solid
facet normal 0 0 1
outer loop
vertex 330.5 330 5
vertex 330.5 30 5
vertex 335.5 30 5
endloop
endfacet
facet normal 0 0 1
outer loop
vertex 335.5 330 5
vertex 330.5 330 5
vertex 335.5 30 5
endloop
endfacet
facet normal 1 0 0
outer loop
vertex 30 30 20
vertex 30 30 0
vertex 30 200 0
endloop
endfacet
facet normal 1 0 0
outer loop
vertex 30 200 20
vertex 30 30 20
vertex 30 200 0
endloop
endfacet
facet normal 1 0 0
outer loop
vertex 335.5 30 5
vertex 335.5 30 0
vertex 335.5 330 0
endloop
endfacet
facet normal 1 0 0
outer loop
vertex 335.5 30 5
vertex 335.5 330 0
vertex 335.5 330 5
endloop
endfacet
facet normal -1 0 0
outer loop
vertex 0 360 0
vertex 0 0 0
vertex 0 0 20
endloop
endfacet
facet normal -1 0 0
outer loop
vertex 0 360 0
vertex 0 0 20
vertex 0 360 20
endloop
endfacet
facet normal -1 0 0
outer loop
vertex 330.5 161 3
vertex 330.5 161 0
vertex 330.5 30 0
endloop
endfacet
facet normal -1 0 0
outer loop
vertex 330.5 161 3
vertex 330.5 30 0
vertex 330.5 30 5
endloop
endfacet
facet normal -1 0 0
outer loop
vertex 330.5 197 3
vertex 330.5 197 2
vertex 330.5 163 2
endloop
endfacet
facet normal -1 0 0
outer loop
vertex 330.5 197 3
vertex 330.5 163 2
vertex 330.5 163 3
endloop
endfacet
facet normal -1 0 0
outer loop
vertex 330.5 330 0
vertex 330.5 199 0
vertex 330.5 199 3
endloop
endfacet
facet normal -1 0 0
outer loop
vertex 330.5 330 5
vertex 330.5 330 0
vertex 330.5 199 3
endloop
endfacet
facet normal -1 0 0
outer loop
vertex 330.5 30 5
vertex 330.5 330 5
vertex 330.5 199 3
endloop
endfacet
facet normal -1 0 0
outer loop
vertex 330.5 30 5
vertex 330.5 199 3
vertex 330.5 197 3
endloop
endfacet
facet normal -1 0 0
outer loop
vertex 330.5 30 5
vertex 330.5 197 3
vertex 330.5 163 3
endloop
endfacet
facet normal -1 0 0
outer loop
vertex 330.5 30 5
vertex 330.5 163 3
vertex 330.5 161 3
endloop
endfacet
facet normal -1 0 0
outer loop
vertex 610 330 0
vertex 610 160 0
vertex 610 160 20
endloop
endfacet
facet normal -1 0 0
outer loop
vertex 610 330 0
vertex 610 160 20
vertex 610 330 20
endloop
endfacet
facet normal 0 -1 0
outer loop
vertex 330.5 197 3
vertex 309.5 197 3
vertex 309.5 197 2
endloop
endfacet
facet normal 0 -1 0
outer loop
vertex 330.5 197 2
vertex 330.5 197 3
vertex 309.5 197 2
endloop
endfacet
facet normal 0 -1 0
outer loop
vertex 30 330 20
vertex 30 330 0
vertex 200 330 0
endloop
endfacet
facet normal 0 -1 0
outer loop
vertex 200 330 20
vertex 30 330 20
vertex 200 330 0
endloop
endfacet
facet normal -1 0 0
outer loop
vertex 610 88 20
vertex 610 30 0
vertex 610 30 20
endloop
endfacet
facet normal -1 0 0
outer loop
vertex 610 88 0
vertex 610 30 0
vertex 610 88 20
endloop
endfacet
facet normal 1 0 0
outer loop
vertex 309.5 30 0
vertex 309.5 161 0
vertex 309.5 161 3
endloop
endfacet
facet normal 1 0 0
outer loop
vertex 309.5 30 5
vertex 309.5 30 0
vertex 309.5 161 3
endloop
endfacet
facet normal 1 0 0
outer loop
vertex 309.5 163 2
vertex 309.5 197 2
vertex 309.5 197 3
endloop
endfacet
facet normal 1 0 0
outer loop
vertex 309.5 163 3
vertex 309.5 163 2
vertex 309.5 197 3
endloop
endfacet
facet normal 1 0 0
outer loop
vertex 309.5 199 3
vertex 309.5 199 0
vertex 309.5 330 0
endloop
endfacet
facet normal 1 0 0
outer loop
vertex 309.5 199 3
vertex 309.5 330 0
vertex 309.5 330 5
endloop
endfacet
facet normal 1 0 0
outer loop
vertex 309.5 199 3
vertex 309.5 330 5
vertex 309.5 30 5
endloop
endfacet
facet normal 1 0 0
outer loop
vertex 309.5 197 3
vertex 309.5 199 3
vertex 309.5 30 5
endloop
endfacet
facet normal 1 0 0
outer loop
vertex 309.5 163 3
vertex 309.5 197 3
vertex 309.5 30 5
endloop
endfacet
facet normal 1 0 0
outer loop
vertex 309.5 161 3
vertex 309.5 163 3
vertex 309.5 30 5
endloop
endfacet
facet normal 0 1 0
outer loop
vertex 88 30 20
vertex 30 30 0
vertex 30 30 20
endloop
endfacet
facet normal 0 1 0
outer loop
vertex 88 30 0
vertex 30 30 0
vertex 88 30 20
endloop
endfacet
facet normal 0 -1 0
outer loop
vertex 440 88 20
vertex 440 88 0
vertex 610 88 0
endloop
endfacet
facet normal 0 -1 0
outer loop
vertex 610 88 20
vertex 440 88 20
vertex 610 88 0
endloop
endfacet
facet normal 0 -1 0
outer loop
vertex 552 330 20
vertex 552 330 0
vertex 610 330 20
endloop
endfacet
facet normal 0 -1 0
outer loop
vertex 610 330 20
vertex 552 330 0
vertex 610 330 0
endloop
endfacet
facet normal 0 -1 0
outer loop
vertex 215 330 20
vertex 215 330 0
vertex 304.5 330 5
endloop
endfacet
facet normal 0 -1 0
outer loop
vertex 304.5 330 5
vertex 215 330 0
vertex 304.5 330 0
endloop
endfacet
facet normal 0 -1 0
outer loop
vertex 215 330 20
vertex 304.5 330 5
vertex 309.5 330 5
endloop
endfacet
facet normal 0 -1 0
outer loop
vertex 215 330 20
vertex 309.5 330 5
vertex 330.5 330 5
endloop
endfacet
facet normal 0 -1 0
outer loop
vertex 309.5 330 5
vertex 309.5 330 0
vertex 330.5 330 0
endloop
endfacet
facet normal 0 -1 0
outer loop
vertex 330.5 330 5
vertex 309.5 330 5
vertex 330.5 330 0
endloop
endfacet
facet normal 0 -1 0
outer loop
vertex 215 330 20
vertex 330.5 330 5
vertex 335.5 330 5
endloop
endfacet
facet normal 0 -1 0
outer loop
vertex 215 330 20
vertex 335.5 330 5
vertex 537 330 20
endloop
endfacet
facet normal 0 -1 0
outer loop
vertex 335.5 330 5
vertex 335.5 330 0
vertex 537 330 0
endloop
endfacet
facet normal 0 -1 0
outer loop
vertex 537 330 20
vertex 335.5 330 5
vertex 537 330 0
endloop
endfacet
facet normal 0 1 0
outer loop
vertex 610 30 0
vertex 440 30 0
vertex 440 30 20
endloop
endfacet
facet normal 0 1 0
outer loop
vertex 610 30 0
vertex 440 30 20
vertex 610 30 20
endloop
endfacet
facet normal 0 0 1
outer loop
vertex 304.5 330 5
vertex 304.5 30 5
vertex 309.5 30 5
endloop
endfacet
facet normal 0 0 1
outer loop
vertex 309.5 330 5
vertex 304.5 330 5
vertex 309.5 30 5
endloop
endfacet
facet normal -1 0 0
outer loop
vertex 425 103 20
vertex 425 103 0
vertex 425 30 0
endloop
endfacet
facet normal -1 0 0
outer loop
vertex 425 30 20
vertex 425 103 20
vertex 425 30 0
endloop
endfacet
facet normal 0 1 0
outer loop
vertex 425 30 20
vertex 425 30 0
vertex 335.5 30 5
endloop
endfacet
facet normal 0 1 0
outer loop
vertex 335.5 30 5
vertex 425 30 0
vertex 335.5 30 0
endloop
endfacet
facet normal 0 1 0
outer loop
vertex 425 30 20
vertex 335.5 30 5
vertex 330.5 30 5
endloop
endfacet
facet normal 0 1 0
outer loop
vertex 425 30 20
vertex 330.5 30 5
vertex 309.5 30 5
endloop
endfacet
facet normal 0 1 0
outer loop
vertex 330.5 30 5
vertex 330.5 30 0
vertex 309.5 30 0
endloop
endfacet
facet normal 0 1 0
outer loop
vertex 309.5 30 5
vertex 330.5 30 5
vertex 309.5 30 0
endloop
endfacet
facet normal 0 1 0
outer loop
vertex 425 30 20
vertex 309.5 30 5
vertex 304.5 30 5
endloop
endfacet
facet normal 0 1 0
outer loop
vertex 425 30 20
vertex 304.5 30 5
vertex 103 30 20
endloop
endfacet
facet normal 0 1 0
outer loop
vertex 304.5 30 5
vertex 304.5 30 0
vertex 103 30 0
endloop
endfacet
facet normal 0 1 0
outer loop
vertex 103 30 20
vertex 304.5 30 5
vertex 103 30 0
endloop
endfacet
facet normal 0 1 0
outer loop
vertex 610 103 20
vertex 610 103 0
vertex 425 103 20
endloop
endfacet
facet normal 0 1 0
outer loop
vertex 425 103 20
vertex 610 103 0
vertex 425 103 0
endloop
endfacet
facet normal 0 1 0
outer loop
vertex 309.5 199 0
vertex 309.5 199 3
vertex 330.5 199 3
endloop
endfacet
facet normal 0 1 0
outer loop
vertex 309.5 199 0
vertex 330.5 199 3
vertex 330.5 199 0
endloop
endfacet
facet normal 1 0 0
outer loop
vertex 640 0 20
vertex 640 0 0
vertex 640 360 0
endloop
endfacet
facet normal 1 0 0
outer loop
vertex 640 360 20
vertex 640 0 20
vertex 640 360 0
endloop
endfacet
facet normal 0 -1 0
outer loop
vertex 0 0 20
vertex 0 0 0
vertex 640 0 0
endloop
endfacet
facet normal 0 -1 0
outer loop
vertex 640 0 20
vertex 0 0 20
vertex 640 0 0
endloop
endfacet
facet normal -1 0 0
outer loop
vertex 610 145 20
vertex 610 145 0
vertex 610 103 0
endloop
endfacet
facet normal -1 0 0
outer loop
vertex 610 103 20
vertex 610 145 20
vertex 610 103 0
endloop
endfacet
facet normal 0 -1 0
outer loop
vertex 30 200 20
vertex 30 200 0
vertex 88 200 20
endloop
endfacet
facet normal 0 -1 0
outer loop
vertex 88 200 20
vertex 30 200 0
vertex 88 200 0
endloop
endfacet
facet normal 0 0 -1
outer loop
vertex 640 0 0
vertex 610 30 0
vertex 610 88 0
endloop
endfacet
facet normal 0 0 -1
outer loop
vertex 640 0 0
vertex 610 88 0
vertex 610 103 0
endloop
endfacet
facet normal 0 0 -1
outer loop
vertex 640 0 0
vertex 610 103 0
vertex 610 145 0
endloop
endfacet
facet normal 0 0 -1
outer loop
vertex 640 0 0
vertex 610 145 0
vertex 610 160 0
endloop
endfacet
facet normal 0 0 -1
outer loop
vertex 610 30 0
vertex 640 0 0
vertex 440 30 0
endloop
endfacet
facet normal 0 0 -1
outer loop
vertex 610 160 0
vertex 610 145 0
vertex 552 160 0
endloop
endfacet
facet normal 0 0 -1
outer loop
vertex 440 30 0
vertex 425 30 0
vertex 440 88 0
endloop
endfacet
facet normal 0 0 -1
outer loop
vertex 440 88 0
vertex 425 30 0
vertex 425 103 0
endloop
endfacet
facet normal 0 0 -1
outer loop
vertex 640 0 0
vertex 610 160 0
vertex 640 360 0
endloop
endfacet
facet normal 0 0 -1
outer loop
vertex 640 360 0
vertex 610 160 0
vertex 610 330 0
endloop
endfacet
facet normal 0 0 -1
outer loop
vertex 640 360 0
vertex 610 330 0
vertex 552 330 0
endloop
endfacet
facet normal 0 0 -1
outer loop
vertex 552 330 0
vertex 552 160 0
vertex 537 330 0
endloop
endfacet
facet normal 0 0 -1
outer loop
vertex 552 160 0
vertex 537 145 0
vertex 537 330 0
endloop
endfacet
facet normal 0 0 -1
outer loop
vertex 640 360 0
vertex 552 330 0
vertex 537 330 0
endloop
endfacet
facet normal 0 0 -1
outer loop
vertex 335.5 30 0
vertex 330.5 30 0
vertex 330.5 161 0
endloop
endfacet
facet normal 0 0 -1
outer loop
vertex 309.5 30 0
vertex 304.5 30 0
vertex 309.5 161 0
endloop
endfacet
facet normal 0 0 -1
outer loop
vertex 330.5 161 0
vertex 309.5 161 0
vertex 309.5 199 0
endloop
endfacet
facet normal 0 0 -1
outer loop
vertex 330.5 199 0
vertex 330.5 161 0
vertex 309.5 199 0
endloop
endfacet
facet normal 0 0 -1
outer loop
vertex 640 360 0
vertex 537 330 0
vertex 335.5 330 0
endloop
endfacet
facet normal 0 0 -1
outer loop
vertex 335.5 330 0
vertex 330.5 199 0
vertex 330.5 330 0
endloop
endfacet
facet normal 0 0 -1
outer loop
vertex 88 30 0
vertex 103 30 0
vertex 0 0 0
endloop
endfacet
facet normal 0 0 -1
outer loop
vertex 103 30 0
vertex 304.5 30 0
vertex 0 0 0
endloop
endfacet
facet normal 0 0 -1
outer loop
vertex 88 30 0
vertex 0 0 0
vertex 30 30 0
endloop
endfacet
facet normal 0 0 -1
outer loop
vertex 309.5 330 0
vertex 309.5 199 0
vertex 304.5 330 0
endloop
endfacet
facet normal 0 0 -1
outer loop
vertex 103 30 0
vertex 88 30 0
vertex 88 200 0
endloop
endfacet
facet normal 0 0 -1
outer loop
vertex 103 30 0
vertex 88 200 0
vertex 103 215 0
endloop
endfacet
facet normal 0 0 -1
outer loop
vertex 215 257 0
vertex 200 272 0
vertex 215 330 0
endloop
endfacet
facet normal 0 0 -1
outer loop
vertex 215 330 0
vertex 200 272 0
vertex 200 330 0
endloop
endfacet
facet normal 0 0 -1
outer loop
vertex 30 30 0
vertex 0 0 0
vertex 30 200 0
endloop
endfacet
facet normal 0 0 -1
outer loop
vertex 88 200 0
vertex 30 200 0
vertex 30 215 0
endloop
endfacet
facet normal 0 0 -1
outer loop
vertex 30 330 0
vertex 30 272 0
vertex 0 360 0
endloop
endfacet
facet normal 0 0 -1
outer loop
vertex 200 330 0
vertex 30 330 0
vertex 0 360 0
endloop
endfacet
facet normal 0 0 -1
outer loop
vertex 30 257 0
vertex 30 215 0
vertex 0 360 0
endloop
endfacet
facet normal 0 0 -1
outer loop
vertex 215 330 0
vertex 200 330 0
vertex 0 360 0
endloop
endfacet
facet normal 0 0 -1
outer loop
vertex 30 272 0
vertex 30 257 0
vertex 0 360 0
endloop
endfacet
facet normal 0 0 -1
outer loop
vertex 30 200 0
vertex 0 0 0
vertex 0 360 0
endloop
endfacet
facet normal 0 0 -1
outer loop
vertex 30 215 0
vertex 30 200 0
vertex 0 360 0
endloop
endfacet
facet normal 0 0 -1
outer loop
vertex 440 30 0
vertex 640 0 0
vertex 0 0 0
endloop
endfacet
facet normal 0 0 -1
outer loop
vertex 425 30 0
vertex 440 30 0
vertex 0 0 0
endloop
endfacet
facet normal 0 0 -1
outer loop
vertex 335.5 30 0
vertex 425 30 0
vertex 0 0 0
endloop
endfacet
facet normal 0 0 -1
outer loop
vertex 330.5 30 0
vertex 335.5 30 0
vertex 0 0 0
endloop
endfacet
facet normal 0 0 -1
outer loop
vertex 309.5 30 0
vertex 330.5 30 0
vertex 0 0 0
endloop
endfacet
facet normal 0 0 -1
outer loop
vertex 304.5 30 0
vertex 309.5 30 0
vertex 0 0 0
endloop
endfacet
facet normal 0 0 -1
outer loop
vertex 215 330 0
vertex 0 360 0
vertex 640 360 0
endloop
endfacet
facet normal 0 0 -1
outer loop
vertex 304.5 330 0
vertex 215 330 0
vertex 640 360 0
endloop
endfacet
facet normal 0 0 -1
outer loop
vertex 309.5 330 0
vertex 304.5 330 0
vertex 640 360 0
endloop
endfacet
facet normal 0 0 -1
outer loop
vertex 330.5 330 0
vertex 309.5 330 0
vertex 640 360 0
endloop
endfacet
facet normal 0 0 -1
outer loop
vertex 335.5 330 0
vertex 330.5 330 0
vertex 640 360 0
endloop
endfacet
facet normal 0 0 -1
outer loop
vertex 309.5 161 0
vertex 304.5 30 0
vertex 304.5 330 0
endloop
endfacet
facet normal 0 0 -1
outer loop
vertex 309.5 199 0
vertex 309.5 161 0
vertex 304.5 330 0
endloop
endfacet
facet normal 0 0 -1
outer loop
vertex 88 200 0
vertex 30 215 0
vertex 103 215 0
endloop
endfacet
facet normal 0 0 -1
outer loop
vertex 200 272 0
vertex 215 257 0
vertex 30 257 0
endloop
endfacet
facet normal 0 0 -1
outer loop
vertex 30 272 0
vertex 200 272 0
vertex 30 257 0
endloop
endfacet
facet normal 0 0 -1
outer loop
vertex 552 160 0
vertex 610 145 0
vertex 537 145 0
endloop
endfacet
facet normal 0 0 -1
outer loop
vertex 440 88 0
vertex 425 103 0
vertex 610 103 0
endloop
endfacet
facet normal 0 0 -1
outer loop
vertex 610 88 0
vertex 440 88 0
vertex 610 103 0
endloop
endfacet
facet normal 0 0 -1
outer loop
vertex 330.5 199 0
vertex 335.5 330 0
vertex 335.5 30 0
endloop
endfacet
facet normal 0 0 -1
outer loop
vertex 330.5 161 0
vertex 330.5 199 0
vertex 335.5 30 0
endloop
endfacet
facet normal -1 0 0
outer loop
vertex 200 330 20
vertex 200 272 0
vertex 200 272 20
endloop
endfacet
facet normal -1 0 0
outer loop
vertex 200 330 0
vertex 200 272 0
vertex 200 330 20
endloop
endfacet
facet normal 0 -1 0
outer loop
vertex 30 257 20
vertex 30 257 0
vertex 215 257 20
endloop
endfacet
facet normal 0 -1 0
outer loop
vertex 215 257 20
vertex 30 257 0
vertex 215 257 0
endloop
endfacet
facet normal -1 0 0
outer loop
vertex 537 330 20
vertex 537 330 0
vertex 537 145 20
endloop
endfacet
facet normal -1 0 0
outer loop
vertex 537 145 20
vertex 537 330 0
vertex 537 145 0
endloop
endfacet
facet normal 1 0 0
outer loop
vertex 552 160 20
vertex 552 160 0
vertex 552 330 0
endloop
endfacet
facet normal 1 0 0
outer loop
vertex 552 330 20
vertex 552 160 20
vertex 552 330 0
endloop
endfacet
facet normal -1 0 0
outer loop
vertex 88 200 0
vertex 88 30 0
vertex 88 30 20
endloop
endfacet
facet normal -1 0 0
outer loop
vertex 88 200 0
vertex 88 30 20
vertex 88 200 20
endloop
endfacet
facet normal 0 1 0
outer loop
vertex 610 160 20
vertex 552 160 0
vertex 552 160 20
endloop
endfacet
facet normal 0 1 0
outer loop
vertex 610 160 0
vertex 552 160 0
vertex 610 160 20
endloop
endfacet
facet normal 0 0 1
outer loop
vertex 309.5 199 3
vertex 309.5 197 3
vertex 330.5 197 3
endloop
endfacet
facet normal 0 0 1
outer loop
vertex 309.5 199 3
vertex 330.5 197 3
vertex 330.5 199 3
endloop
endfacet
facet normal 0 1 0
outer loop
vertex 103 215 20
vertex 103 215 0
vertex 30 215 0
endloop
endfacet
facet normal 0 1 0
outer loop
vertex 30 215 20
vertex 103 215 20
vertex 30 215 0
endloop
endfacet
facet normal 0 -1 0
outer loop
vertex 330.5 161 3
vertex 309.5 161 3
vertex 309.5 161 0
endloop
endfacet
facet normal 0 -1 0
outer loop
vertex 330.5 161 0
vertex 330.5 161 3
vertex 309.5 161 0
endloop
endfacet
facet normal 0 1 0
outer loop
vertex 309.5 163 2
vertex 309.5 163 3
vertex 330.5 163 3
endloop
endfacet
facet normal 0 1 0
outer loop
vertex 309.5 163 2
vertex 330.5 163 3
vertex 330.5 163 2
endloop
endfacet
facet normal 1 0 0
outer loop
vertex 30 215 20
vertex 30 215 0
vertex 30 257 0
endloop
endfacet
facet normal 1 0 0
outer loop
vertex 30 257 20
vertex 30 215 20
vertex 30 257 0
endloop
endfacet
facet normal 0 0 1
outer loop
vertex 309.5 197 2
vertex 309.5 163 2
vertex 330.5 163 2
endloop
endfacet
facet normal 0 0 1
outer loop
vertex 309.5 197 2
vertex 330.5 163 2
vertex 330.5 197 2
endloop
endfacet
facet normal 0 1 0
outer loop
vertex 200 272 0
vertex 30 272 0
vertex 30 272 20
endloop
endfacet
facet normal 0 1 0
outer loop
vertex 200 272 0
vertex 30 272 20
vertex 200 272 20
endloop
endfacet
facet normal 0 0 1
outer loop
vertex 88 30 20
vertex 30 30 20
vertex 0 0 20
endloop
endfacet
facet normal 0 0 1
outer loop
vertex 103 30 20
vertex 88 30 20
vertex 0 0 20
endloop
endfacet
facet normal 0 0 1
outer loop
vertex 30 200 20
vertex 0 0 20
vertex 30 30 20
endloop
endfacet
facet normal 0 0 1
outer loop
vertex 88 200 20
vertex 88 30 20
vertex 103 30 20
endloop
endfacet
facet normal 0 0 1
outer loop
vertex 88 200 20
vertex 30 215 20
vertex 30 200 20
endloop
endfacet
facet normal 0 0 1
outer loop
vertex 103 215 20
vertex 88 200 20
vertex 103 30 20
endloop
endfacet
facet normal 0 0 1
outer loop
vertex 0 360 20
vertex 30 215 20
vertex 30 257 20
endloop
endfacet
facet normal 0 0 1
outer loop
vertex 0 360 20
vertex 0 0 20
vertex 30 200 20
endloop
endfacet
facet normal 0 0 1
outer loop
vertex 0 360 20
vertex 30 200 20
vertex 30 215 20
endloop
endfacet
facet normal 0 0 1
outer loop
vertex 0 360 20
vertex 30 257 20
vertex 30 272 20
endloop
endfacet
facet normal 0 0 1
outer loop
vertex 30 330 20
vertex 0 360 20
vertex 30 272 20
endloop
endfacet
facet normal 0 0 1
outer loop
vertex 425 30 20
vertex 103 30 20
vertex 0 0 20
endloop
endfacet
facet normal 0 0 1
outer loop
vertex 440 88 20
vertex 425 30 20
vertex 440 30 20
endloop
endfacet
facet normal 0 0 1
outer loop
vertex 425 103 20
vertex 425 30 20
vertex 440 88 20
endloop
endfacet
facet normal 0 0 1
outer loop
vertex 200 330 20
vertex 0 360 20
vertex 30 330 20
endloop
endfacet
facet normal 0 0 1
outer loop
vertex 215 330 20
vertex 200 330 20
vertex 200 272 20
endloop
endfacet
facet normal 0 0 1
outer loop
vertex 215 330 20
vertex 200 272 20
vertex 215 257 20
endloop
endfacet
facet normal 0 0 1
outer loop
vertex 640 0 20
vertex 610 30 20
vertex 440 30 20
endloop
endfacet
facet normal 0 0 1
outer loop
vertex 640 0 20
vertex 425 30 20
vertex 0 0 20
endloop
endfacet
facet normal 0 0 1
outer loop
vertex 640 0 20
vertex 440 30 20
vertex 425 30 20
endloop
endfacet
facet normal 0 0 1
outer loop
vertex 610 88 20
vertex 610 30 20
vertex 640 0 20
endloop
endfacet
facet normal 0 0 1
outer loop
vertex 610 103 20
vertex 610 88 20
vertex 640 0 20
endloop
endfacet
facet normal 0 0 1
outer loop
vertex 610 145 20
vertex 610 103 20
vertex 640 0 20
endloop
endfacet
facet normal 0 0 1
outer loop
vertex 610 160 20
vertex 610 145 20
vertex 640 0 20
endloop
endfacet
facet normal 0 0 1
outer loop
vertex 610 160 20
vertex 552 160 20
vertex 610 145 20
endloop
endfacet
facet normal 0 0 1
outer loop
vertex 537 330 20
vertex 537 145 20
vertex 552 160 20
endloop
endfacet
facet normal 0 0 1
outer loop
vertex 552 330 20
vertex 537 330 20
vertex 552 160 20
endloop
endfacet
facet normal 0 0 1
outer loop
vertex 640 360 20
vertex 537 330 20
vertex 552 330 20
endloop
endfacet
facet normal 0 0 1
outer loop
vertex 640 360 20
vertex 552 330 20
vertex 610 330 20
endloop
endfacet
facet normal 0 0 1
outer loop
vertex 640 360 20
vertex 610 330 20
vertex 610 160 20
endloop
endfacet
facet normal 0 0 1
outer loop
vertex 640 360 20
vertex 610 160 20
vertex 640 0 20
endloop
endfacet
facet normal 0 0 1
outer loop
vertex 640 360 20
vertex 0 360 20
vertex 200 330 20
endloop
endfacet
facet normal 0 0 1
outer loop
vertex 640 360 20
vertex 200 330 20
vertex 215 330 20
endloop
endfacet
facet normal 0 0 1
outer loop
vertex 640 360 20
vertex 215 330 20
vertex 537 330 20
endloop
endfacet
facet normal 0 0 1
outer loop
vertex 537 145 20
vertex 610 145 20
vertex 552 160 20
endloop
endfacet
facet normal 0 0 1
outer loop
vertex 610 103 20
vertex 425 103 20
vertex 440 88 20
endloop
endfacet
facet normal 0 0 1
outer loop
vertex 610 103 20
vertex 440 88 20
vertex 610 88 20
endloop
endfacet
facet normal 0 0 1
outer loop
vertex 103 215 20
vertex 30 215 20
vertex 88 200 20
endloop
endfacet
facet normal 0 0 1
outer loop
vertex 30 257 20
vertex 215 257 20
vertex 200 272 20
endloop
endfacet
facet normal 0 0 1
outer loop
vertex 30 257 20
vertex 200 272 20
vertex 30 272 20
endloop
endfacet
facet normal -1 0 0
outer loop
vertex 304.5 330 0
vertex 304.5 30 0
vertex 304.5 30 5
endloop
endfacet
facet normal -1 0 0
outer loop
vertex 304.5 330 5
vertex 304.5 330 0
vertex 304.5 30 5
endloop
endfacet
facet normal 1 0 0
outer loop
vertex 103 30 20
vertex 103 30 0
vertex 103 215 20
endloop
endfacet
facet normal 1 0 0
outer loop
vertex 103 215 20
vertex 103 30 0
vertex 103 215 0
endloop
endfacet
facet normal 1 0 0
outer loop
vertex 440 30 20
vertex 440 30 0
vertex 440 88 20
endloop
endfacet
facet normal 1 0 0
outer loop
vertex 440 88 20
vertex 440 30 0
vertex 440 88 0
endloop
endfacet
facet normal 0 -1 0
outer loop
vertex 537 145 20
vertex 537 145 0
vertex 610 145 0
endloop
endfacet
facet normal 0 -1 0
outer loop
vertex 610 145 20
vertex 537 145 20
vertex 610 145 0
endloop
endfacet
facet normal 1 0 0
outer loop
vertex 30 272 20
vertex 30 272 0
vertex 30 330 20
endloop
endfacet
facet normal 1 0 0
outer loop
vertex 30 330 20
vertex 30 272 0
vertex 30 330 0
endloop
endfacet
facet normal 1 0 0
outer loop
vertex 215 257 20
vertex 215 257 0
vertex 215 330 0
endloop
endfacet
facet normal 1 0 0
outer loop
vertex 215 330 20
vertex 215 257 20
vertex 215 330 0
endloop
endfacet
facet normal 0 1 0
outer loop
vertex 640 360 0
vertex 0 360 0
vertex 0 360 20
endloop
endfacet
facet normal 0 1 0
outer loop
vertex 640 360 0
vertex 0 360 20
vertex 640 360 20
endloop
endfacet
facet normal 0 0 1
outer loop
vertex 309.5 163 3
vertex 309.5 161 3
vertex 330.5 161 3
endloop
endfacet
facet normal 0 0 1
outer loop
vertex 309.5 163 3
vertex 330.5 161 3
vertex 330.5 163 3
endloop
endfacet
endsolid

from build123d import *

# Parameters (mm, degrees)
ESBO_O1_W                = 640
ESBO_O1_H                = 360
ESBO_O1_W_2              = 170
ESBO_O1_H_2              = 58
ESBO_O1_W_3              = 58
ESBO_O1_H_3              = 170
RESSALTO_EXTRUS_O1_DEPTH = 20
SKETCH1_W                = 5
SKETCH1_H                = 5
BOSS_EXTRUDE1_DEPTH      = 300
SKETCH2_W                = 2
SKETCH2_H                = 34
BOSS_EXTRUDE2_DEPTH      = 21
SKETCH3_W                = 3
SKETCH3_H                = 2
BOSS_EXTRUDE3_DEPTH      = 21


with BuildPart() as part:
    # Esboço1 → Ressalto-extrusão1 (new body)
    with BuildSketch(Plane.XY):
        with Locations((320, 180)):
            Rectangle(ESBO_O1_W, ESBO_O1_H)
        Polygon((215, 330), (537, 330), (537, 160), (537, 145), (610, 145), (610, 103), (425, 103), (425, 88), (425, 30), (103, 30), (103, 215), (88, 215), (30, 215), (30, 257), (200, 257), (215, 257), align=None, mode=Mode.SUBTRACT)
        with Locations((115, 301)):
            Rectangle(ESBO_O1_W_2, ESBO_O1_H_2, mode=Mode.SUBTRACT)
        with Locations((59, 115)):
            Rectangle(ESBO_O1_W_3, ESBO_O1_H_3, mode=Mode.SUBTRACT)
        with Locations((581, 245)):
            Rectangle(ESBO_O1_W_3, ESBO_O1_H_3, mode=Mode.SUBTRACT)
        with Locations((525, 59)):
            Rectangle(ESBO_O1_W_2, ESBO_O1_H_2, mode=Mode.SUBTRACT)
    extrude(amount=RESSALTO_EXTRUS_O1_DEPTH)

    # Sketch1 → Boss-Extrude1 (add)
    with BuildSketch(Plane.XZ.offset(-330)):
        with Locations((307, 2.5)):
            Rectangle(SKETCH1_W, SKETCH1_H)
        with Locations((333, 2.5)):
            Rectangle(SKETCH1_W, SKETCH1_H)
    extrude(amount=BOSS_EXTRUDE1_DEPTH)

    # Sketch2 → Boss-Extrude2 (add)
    with BuildSketch(Plane(origin=(309.5, 0, 0), x_dir=(0, 0, -1), z_dir=(1, 0, 0))):
        with Locations((-1, 180)):
            Rectangle(SKETCH2_W, SKETCH2_H)
    extrude(amount=BOSS_EXTRUDE2_DEPTH)

    # Sketch3 → Boss-Extrude3 (add)
    with BuildSketch(Plane(origin=(309.5, 0, 0), x_dir=(0, 0, -1), z_dir=(1, 0, 0))):
        with Locations((-1.5, 198)):
            Rectangle(SKETCH3_W, SKETCH3_H)
        with Locations((-1.5, 162)):
            Rectangle(SKETCH3_W, SKETCH3_H)
    extrude(amount=BOSS_EXTRUDE3_DEPTH)


solid = part.part
